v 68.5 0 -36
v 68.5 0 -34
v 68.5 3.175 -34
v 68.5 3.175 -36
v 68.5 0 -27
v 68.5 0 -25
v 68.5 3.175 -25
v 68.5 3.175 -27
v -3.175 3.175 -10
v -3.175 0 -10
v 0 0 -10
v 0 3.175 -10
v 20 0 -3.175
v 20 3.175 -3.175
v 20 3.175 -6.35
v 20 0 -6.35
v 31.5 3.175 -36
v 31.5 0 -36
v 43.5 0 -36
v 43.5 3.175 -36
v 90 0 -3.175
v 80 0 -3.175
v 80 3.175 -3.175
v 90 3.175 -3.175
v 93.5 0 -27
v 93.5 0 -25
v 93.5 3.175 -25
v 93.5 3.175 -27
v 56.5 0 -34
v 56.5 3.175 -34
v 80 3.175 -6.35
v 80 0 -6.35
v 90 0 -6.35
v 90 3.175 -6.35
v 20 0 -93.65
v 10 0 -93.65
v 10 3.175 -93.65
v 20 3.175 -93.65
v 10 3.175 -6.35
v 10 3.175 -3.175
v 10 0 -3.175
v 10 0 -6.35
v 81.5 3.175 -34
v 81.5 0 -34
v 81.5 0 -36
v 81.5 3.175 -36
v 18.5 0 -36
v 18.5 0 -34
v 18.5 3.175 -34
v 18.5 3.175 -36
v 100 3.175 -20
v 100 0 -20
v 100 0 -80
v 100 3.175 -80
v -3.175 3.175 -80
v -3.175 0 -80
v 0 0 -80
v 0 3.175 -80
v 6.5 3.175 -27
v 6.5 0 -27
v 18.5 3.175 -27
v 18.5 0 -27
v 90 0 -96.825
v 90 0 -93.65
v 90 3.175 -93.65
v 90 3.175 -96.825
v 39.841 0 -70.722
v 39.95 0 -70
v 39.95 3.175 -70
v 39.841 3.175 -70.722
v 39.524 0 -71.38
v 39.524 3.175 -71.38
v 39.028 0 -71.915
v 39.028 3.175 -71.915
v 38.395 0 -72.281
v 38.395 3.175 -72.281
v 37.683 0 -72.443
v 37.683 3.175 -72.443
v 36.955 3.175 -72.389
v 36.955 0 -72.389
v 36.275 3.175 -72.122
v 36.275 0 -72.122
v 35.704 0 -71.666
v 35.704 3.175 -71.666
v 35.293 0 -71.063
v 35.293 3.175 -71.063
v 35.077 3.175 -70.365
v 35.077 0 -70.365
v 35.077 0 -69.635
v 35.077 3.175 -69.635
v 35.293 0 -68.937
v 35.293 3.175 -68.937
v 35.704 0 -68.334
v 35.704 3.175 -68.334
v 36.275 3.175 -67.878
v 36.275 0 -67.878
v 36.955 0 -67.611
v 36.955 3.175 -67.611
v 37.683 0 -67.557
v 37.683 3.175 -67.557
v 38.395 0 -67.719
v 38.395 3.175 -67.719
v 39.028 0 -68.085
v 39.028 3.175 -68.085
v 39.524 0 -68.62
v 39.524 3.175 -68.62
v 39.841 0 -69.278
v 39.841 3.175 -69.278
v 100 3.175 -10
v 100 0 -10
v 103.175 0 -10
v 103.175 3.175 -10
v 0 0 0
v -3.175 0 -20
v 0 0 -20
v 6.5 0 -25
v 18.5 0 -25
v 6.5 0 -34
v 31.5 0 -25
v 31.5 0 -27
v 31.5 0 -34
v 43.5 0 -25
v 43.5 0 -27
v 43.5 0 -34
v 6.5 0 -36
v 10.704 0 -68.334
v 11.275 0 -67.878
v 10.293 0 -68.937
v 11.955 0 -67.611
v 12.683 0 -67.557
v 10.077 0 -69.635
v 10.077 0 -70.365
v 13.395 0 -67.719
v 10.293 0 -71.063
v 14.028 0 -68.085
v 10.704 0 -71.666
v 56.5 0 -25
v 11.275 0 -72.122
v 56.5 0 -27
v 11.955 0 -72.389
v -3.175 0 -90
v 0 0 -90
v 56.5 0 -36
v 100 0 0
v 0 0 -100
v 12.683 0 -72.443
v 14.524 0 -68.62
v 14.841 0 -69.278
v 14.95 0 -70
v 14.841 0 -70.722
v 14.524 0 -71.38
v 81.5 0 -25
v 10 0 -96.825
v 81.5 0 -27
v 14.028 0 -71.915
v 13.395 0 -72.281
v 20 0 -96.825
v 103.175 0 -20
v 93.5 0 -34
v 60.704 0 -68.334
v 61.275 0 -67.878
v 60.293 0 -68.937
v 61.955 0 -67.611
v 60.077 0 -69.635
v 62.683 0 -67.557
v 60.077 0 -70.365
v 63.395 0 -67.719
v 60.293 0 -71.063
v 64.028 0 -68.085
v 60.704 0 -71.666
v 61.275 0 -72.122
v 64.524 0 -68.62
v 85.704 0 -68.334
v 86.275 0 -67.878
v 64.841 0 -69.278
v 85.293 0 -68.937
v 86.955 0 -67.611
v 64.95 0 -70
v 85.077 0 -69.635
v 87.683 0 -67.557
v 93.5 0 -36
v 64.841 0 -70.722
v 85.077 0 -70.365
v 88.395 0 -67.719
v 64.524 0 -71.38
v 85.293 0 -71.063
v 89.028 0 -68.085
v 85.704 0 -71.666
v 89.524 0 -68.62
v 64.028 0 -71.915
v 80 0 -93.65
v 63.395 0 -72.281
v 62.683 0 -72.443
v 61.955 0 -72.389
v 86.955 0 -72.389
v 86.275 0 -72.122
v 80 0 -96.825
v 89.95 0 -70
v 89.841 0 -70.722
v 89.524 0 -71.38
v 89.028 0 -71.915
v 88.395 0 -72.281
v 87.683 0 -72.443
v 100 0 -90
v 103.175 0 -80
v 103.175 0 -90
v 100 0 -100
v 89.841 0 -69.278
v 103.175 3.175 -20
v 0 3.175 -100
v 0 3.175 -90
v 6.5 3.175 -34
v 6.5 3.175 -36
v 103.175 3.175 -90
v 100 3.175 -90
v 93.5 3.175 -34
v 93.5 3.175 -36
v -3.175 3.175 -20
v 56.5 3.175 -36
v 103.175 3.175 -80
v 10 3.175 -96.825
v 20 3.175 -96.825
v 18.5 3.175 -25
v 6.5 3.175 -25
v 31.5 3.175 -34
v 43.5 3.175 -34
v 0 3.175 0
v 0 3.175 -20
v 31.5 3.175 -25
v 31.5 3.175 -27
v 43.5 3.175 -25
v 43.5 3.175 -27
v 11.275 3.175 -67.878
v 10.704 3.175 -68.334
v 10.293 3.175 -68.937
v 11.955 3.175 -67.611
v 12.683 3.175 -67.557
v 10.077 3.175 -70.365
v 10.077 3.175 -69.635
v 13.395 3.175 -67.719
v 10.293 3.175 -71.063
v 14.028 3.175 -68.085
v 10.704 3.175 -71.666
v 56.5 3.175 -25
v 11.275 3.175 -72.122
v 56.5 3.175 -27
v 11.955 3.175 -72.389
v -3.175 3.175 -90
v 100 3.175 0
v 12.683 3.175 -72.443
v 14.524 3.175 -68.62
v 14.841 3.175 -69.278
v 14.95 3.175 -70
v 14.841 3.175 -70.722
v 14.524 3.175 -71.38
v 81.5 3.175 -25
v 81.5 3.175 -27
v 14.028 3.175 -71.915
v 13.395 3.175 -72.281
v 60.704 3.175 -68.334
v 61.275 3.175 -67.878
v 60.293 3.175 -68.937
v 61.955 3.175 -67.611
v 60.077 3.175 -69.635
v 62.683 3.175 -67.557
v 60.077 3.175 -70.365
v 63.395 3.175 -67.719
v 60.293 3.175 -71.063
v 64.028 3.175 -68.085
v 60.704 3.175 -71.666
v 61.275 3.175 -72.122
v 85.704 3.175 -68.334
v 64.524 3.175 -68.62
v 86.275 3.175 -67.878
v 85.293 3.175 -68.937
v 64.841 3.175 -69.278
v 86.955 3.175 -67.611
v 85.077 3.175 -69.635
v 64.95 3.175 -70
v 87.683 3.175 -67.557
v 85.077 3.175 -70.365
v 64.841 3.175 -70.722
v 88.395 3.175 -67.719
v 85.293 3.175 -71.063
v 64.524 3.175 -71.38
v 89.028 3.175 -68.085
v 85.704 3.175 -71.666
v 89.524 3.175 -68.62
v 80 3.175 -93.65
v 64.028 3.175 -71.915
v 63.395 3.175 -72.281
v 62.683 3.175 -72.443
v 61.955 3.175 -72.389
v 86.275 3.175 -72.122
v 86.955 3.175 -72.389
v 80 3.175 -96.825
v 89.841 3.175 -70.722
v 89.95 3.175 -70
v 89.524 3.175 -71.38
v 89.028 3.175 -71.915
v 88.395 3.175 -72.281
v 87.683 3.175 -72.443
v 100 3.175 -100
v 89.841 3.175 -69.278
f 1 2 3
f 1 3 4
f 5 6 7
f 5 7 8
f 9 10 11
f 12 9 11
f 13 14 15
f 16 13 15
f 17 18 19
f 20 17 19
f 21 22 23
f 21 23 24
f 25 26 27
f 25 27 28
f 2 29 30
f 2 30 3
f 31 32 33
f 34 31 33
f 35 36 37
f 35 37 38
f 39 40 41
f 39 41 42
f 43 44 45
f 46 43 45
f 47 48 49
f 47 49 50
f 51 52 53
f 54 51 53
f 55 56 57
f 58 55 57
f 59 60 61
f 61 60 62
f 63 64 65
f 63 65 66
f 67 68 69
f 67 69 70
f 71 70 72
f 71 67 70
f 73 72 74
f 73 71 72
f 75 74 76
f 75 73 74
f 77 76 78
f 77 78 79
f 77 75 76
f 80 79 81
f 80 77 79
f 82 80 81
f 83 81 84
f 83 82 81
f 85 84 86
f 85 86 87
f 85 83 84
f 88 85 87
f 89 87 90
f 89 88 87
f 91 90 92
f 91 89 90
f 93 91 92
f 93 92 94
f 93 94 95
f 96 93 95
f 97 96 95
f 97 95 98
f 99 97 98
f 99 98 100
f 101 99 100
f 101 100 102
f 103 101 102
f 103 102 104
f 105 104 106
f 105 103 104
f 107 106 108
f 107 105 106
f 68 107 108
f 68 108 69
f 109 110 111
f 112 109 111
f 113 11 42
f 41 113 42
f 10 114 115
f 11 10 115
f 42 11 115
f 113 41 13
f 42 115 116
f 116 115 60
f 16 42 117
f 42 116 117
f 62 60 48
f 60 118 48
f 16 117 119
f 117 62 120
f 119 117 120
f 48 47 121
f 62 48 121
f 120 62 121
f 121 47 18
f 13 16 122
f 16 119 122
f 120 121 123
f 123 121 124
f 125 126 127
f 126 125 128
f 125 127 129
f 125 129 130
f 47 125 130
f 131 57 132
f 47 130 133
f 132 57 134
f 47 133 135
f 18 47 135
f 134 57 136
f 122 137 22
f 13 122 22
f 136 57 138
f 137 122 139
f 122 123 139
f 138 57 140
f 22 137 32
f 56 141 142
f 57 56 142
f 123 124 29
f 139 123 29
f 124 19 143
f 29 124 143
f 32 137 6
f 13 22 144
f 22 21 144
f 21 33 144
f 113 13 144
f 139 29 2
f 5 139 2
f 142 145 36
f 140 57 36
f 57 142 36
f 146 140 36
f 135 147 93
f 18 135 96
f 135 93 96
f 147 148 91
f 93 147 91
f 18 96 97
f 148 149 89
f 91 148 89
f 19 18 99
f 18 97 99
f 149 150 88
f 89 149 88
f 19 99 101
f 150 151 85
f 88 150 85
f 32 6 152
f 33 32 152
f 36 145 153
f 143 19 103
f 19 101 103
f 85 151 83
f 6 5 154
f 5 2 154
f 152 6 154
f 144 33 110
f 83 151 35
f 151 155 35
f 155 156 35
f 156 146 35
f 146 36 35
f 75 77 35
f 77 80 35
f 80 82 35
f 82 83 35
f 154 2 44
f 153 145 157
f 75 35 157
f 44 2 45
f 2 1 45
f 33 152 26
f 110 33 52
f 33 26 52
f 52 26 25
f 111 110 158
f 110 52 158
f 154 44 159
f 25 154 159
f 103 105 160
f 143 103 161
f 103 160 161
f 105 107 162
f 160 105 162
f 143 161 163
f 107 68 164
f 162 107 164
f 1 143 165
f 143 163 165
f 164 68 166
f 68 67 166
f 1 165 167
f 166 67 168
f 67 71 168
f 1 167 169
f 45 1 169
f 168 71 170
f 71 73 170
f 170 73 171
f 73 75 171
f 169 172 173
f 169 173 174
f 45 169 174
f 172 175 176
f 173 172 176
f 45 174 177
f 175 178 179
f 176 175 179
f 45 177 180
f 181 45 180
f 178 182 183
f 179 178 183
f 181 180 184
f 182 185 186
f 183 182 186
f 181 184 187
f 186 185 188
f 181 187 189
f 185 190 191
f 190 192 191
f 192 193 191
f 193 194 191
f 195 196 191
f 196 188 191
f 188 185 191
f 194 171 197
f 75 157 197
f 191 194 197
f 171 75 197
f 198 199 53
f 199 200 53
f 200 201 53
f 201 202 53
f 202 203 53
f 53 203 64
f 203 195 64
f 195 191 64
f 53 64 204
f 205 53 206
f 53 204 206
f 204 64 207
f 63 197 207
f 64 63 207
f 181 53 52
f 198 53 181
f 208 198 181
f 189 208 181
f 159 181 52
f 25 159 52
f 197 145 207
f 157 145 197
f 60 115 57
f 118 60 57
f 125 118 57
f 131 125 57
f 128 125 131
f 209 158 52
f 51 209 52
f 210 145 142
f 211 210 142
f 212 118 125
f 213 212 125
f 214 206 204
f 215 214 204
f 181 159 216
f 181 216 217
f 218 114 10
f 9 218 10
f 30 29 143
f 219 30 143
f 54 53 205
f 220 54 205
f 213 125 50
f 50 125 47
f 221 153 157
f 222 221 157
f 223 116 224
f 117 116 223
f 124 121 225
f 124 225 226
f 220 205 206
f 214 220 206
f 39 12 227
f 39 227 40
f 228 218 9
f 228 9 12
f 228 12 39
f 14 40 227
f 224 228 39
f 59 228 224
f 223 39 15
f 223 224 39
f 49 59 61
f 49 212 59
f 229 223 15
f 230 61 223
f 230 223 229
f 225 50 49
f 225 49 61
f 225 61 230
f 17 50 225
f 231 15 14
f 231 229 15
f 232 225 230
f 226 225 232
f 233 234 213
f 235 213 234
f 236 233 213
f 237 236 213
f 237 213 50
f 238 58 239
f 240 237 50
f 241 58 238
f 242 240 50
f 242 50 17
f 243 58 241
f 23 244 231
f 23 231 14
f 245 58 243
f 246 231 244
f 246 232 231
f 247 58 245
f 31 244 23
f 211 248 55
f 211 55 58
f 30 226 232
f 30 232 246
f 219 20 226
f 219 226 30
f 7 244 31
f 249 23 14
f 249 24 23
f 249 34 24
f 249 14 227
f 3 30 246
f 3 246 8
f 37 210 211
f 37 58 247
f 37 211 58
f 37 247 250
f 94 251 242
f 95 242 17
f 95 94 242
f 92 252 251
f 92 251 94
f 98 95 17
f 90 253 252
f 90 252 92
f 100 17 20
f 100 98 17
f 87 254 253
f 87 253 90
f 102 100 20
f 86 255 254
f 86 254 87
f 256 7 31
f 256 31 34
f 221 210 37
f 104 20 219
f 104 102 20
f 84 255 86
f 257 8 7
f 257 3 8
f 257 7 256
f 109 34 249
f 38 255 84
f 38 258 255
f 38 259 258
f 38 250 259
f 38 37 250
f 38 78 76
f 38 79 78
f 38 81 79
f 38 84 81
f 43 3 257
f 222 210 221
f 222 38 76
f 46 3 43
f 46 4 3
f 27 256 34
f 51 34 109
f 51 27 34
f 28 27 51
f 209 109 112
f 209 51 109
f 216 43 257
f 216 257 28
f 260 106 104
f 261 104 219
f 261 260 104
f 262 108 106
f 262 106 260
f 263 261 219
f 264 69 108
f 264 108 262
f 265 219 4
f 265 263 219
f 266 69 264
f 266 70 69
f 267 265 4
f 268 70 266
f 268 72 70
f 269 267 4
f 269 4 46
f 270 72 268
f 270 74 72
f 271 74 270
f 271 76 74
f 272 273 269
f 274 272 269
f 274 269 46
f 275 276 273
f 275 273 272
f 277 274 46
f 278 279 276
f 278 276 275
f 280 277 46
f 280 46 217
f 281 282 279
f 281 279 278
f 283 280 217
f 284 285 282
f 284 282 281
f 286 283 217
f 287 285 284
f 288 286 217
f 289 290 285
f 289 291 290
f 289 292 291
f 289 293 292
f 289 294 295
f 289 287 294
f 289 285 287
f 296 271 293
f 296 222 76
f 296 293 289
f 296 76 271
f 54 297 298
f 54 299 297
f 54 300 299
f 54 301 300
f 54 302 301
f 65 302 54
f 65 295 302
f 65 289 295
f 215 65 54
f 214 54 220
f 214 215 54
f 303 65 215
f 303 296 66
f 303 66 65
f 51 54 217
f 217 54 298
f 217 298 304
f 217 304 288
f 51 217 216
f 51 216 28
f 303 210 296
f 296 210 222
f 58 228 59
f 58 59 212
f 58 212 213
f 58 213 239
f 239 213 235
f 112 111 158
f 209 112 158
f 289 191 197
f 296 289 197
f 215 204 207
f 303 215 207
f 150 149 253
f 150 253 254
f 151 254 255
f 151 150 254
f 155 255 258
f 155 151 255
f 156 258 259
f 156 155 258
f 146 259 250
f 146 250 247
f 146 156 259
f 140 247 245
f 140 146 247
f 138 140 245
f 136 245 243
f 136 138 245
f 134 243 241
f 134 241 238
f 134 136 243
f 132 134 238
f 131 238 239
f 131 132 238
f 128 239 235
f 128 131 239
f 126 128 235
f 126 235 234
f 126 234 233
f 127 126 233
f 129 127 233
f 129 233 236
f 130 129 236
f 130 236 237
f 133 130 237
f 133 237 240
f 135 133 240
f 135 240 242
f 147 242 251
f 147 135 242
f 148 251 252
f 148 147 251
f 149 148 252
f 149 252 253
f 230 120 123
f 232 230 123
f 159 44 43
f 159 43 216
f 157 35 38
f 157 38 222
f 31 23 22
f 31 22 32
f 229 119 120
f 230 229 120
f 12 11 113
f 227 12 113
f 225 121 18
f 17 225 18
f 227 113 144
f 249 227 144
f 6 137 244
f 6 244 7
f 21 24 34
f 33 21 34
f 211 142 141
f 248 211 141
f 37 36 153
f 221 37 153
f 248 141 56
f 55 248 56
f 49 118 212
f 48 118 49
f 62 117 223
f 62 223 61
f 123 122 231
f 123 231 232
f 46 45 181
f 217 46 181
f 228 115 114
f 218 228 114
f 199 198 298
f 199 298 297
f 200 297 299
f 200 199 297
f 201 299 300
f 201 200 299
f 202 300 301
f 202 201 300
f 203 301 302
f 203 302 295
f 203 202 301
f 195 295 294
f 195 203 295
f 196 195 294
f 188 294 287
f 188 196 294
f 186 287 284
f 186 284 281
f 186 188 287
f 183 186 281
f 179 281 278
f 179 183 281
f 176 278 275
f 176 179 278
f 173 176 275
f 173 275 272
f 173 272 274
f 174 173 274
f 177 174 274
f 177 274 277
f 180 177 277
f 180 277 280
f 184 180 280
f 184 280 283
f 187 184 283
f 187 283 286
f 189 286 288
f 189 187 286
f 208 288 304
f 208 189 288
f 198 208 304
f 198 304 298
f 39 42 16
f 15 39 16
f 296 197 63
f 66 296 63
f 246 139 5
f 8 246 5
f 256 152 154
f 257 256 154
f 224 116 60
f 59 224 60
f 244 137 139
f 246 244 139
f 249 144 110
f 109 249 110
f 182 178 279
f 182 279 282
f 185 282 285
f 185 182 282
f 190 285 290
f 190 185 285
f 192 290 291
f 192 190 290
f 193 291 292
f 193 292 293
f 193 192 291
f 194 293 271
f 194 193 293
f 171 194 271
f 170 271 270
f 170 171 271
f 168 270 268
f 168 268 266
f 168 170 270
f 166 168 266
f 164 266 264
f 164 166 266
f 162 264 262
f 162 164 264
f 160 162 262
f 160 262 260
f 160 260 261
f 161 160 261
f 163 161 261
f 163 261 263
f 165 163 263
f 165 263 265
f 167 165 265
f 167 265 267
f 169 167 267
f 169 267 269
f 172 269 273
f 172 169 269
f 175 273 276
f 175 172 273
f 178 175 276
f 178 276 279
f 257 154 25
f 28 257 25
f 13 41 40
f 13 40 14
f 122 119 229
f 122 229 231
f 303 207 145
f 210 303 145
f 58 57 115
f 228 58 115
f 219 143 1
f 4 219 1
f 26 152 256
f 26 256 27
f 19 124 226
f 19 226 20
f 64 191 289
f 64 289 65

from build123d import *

# Parameters (mm, degrees)
SKETCH1_R           = 2.45
SKETCH1_W           = 10
SKETCH1_H           = 3.175
SKETCH1_W_2         = 12
SKETCH1_H_2         = 2
BOSS_EXTRUDE1_DEPTH = 3.175


with BuildPart() as part:
    # Sketch1 → Boss-Extrude1 (new body)
    with BuildSketch(Plane(origin=(0, 0, 0), x_dir=(1, 0, 0), z_dir=(0, 1, 0))):
        Polygon((0, 0), (100, 0), (100, 10), (103.175, 10), (103.175, 20), (100, 20), (100, 80), (103.175, 80), (103.175, 90), (100, 90), (100, 100), (0, 100), (0, 90), (-3.175, 90), (-3.175, 80), (0, 80), (0, 20), (-3.175, 20), (-3.175, 10), (0, 10), align=None)
        with Locations((12.5, 70)):
            Circle(SKETCH1_R, mode=Mode.SUBTRACT)
        with Locations((37.5, 70)):
            Circle(SKETCH1_R, mode=Mode.SUBTRACT)
        with Locations((62.5, 70)):
            Circle(SKETCH1_R, mode=Mode.SUBTRACT)
        with Locations((87.5, 70)):
            Circle(SKETCH1_R, mode=Mode.SUBTRACT)
        with Locations((15, 95.2375)):
            Rectangle(SKETCH1_W, SKETCH1_H, mode=Mode.SUBTRACT)
        with Locations((85, 95.2375)):
            Rectangle(SKETCH1_W, SKETCH1_H, mode=Mode.SUBTRACT)
        with Locations((85, 4.7625)):
            Rectangle(SKETCH1_W, SKETCH1_H, mode=Mode.SUBTRACT)
        with Locations((15, 4.7625)):
            Rectangle(SKETCH1_W, SKETCH1_H, mode=Mode.SUBTRACT)
        with Locations((37.5, 35)):
            Rectangle(SKETCH1_W_2, SKETCH1_H_2, mode=Mode.SUBTRACT)
        with Locations((12.5, 35)):
            Rectangle(SKETCH1_W_2, SKETCH1_H_2, mode=Mode.SUBTRACT)
        with Locations((12.5, 26)):
            Rectangle(SKETCH1_W_2, SKETCH1_H_2, mode=Mode.SUBTRACT)
        with Locations((37.5, 26)):
            Rectangle(SKETCH1_W_2, SKETCH1_H_2, mode=Mode.SUBTRACT)
        with Locations((62.5, 35)):
            Rectangle(SKETCH1_W_2, SKETCH1_H_2, mode=Mode.SUBTRACT)
        with Locations((62.5, 26)):
            Rectangle(SKETCH1_W_2, SKETCH1_H_2, mode=Mode.SUBTRACT)
        with Locations((87.5, 35)):
            Rectangle(SKETCH1_W_2, SKETCH1_H_2, mode=Mode.SUBTRACT)
        with Locations((87.5, 26)):
            Rectangle(SKETCH1_W_2, SKETCH1_H_2, mode=Mode.SUBTRACT)
    extrude(amount=BOSS_EXTRUDE1_DEPTH)


solid = part.part
